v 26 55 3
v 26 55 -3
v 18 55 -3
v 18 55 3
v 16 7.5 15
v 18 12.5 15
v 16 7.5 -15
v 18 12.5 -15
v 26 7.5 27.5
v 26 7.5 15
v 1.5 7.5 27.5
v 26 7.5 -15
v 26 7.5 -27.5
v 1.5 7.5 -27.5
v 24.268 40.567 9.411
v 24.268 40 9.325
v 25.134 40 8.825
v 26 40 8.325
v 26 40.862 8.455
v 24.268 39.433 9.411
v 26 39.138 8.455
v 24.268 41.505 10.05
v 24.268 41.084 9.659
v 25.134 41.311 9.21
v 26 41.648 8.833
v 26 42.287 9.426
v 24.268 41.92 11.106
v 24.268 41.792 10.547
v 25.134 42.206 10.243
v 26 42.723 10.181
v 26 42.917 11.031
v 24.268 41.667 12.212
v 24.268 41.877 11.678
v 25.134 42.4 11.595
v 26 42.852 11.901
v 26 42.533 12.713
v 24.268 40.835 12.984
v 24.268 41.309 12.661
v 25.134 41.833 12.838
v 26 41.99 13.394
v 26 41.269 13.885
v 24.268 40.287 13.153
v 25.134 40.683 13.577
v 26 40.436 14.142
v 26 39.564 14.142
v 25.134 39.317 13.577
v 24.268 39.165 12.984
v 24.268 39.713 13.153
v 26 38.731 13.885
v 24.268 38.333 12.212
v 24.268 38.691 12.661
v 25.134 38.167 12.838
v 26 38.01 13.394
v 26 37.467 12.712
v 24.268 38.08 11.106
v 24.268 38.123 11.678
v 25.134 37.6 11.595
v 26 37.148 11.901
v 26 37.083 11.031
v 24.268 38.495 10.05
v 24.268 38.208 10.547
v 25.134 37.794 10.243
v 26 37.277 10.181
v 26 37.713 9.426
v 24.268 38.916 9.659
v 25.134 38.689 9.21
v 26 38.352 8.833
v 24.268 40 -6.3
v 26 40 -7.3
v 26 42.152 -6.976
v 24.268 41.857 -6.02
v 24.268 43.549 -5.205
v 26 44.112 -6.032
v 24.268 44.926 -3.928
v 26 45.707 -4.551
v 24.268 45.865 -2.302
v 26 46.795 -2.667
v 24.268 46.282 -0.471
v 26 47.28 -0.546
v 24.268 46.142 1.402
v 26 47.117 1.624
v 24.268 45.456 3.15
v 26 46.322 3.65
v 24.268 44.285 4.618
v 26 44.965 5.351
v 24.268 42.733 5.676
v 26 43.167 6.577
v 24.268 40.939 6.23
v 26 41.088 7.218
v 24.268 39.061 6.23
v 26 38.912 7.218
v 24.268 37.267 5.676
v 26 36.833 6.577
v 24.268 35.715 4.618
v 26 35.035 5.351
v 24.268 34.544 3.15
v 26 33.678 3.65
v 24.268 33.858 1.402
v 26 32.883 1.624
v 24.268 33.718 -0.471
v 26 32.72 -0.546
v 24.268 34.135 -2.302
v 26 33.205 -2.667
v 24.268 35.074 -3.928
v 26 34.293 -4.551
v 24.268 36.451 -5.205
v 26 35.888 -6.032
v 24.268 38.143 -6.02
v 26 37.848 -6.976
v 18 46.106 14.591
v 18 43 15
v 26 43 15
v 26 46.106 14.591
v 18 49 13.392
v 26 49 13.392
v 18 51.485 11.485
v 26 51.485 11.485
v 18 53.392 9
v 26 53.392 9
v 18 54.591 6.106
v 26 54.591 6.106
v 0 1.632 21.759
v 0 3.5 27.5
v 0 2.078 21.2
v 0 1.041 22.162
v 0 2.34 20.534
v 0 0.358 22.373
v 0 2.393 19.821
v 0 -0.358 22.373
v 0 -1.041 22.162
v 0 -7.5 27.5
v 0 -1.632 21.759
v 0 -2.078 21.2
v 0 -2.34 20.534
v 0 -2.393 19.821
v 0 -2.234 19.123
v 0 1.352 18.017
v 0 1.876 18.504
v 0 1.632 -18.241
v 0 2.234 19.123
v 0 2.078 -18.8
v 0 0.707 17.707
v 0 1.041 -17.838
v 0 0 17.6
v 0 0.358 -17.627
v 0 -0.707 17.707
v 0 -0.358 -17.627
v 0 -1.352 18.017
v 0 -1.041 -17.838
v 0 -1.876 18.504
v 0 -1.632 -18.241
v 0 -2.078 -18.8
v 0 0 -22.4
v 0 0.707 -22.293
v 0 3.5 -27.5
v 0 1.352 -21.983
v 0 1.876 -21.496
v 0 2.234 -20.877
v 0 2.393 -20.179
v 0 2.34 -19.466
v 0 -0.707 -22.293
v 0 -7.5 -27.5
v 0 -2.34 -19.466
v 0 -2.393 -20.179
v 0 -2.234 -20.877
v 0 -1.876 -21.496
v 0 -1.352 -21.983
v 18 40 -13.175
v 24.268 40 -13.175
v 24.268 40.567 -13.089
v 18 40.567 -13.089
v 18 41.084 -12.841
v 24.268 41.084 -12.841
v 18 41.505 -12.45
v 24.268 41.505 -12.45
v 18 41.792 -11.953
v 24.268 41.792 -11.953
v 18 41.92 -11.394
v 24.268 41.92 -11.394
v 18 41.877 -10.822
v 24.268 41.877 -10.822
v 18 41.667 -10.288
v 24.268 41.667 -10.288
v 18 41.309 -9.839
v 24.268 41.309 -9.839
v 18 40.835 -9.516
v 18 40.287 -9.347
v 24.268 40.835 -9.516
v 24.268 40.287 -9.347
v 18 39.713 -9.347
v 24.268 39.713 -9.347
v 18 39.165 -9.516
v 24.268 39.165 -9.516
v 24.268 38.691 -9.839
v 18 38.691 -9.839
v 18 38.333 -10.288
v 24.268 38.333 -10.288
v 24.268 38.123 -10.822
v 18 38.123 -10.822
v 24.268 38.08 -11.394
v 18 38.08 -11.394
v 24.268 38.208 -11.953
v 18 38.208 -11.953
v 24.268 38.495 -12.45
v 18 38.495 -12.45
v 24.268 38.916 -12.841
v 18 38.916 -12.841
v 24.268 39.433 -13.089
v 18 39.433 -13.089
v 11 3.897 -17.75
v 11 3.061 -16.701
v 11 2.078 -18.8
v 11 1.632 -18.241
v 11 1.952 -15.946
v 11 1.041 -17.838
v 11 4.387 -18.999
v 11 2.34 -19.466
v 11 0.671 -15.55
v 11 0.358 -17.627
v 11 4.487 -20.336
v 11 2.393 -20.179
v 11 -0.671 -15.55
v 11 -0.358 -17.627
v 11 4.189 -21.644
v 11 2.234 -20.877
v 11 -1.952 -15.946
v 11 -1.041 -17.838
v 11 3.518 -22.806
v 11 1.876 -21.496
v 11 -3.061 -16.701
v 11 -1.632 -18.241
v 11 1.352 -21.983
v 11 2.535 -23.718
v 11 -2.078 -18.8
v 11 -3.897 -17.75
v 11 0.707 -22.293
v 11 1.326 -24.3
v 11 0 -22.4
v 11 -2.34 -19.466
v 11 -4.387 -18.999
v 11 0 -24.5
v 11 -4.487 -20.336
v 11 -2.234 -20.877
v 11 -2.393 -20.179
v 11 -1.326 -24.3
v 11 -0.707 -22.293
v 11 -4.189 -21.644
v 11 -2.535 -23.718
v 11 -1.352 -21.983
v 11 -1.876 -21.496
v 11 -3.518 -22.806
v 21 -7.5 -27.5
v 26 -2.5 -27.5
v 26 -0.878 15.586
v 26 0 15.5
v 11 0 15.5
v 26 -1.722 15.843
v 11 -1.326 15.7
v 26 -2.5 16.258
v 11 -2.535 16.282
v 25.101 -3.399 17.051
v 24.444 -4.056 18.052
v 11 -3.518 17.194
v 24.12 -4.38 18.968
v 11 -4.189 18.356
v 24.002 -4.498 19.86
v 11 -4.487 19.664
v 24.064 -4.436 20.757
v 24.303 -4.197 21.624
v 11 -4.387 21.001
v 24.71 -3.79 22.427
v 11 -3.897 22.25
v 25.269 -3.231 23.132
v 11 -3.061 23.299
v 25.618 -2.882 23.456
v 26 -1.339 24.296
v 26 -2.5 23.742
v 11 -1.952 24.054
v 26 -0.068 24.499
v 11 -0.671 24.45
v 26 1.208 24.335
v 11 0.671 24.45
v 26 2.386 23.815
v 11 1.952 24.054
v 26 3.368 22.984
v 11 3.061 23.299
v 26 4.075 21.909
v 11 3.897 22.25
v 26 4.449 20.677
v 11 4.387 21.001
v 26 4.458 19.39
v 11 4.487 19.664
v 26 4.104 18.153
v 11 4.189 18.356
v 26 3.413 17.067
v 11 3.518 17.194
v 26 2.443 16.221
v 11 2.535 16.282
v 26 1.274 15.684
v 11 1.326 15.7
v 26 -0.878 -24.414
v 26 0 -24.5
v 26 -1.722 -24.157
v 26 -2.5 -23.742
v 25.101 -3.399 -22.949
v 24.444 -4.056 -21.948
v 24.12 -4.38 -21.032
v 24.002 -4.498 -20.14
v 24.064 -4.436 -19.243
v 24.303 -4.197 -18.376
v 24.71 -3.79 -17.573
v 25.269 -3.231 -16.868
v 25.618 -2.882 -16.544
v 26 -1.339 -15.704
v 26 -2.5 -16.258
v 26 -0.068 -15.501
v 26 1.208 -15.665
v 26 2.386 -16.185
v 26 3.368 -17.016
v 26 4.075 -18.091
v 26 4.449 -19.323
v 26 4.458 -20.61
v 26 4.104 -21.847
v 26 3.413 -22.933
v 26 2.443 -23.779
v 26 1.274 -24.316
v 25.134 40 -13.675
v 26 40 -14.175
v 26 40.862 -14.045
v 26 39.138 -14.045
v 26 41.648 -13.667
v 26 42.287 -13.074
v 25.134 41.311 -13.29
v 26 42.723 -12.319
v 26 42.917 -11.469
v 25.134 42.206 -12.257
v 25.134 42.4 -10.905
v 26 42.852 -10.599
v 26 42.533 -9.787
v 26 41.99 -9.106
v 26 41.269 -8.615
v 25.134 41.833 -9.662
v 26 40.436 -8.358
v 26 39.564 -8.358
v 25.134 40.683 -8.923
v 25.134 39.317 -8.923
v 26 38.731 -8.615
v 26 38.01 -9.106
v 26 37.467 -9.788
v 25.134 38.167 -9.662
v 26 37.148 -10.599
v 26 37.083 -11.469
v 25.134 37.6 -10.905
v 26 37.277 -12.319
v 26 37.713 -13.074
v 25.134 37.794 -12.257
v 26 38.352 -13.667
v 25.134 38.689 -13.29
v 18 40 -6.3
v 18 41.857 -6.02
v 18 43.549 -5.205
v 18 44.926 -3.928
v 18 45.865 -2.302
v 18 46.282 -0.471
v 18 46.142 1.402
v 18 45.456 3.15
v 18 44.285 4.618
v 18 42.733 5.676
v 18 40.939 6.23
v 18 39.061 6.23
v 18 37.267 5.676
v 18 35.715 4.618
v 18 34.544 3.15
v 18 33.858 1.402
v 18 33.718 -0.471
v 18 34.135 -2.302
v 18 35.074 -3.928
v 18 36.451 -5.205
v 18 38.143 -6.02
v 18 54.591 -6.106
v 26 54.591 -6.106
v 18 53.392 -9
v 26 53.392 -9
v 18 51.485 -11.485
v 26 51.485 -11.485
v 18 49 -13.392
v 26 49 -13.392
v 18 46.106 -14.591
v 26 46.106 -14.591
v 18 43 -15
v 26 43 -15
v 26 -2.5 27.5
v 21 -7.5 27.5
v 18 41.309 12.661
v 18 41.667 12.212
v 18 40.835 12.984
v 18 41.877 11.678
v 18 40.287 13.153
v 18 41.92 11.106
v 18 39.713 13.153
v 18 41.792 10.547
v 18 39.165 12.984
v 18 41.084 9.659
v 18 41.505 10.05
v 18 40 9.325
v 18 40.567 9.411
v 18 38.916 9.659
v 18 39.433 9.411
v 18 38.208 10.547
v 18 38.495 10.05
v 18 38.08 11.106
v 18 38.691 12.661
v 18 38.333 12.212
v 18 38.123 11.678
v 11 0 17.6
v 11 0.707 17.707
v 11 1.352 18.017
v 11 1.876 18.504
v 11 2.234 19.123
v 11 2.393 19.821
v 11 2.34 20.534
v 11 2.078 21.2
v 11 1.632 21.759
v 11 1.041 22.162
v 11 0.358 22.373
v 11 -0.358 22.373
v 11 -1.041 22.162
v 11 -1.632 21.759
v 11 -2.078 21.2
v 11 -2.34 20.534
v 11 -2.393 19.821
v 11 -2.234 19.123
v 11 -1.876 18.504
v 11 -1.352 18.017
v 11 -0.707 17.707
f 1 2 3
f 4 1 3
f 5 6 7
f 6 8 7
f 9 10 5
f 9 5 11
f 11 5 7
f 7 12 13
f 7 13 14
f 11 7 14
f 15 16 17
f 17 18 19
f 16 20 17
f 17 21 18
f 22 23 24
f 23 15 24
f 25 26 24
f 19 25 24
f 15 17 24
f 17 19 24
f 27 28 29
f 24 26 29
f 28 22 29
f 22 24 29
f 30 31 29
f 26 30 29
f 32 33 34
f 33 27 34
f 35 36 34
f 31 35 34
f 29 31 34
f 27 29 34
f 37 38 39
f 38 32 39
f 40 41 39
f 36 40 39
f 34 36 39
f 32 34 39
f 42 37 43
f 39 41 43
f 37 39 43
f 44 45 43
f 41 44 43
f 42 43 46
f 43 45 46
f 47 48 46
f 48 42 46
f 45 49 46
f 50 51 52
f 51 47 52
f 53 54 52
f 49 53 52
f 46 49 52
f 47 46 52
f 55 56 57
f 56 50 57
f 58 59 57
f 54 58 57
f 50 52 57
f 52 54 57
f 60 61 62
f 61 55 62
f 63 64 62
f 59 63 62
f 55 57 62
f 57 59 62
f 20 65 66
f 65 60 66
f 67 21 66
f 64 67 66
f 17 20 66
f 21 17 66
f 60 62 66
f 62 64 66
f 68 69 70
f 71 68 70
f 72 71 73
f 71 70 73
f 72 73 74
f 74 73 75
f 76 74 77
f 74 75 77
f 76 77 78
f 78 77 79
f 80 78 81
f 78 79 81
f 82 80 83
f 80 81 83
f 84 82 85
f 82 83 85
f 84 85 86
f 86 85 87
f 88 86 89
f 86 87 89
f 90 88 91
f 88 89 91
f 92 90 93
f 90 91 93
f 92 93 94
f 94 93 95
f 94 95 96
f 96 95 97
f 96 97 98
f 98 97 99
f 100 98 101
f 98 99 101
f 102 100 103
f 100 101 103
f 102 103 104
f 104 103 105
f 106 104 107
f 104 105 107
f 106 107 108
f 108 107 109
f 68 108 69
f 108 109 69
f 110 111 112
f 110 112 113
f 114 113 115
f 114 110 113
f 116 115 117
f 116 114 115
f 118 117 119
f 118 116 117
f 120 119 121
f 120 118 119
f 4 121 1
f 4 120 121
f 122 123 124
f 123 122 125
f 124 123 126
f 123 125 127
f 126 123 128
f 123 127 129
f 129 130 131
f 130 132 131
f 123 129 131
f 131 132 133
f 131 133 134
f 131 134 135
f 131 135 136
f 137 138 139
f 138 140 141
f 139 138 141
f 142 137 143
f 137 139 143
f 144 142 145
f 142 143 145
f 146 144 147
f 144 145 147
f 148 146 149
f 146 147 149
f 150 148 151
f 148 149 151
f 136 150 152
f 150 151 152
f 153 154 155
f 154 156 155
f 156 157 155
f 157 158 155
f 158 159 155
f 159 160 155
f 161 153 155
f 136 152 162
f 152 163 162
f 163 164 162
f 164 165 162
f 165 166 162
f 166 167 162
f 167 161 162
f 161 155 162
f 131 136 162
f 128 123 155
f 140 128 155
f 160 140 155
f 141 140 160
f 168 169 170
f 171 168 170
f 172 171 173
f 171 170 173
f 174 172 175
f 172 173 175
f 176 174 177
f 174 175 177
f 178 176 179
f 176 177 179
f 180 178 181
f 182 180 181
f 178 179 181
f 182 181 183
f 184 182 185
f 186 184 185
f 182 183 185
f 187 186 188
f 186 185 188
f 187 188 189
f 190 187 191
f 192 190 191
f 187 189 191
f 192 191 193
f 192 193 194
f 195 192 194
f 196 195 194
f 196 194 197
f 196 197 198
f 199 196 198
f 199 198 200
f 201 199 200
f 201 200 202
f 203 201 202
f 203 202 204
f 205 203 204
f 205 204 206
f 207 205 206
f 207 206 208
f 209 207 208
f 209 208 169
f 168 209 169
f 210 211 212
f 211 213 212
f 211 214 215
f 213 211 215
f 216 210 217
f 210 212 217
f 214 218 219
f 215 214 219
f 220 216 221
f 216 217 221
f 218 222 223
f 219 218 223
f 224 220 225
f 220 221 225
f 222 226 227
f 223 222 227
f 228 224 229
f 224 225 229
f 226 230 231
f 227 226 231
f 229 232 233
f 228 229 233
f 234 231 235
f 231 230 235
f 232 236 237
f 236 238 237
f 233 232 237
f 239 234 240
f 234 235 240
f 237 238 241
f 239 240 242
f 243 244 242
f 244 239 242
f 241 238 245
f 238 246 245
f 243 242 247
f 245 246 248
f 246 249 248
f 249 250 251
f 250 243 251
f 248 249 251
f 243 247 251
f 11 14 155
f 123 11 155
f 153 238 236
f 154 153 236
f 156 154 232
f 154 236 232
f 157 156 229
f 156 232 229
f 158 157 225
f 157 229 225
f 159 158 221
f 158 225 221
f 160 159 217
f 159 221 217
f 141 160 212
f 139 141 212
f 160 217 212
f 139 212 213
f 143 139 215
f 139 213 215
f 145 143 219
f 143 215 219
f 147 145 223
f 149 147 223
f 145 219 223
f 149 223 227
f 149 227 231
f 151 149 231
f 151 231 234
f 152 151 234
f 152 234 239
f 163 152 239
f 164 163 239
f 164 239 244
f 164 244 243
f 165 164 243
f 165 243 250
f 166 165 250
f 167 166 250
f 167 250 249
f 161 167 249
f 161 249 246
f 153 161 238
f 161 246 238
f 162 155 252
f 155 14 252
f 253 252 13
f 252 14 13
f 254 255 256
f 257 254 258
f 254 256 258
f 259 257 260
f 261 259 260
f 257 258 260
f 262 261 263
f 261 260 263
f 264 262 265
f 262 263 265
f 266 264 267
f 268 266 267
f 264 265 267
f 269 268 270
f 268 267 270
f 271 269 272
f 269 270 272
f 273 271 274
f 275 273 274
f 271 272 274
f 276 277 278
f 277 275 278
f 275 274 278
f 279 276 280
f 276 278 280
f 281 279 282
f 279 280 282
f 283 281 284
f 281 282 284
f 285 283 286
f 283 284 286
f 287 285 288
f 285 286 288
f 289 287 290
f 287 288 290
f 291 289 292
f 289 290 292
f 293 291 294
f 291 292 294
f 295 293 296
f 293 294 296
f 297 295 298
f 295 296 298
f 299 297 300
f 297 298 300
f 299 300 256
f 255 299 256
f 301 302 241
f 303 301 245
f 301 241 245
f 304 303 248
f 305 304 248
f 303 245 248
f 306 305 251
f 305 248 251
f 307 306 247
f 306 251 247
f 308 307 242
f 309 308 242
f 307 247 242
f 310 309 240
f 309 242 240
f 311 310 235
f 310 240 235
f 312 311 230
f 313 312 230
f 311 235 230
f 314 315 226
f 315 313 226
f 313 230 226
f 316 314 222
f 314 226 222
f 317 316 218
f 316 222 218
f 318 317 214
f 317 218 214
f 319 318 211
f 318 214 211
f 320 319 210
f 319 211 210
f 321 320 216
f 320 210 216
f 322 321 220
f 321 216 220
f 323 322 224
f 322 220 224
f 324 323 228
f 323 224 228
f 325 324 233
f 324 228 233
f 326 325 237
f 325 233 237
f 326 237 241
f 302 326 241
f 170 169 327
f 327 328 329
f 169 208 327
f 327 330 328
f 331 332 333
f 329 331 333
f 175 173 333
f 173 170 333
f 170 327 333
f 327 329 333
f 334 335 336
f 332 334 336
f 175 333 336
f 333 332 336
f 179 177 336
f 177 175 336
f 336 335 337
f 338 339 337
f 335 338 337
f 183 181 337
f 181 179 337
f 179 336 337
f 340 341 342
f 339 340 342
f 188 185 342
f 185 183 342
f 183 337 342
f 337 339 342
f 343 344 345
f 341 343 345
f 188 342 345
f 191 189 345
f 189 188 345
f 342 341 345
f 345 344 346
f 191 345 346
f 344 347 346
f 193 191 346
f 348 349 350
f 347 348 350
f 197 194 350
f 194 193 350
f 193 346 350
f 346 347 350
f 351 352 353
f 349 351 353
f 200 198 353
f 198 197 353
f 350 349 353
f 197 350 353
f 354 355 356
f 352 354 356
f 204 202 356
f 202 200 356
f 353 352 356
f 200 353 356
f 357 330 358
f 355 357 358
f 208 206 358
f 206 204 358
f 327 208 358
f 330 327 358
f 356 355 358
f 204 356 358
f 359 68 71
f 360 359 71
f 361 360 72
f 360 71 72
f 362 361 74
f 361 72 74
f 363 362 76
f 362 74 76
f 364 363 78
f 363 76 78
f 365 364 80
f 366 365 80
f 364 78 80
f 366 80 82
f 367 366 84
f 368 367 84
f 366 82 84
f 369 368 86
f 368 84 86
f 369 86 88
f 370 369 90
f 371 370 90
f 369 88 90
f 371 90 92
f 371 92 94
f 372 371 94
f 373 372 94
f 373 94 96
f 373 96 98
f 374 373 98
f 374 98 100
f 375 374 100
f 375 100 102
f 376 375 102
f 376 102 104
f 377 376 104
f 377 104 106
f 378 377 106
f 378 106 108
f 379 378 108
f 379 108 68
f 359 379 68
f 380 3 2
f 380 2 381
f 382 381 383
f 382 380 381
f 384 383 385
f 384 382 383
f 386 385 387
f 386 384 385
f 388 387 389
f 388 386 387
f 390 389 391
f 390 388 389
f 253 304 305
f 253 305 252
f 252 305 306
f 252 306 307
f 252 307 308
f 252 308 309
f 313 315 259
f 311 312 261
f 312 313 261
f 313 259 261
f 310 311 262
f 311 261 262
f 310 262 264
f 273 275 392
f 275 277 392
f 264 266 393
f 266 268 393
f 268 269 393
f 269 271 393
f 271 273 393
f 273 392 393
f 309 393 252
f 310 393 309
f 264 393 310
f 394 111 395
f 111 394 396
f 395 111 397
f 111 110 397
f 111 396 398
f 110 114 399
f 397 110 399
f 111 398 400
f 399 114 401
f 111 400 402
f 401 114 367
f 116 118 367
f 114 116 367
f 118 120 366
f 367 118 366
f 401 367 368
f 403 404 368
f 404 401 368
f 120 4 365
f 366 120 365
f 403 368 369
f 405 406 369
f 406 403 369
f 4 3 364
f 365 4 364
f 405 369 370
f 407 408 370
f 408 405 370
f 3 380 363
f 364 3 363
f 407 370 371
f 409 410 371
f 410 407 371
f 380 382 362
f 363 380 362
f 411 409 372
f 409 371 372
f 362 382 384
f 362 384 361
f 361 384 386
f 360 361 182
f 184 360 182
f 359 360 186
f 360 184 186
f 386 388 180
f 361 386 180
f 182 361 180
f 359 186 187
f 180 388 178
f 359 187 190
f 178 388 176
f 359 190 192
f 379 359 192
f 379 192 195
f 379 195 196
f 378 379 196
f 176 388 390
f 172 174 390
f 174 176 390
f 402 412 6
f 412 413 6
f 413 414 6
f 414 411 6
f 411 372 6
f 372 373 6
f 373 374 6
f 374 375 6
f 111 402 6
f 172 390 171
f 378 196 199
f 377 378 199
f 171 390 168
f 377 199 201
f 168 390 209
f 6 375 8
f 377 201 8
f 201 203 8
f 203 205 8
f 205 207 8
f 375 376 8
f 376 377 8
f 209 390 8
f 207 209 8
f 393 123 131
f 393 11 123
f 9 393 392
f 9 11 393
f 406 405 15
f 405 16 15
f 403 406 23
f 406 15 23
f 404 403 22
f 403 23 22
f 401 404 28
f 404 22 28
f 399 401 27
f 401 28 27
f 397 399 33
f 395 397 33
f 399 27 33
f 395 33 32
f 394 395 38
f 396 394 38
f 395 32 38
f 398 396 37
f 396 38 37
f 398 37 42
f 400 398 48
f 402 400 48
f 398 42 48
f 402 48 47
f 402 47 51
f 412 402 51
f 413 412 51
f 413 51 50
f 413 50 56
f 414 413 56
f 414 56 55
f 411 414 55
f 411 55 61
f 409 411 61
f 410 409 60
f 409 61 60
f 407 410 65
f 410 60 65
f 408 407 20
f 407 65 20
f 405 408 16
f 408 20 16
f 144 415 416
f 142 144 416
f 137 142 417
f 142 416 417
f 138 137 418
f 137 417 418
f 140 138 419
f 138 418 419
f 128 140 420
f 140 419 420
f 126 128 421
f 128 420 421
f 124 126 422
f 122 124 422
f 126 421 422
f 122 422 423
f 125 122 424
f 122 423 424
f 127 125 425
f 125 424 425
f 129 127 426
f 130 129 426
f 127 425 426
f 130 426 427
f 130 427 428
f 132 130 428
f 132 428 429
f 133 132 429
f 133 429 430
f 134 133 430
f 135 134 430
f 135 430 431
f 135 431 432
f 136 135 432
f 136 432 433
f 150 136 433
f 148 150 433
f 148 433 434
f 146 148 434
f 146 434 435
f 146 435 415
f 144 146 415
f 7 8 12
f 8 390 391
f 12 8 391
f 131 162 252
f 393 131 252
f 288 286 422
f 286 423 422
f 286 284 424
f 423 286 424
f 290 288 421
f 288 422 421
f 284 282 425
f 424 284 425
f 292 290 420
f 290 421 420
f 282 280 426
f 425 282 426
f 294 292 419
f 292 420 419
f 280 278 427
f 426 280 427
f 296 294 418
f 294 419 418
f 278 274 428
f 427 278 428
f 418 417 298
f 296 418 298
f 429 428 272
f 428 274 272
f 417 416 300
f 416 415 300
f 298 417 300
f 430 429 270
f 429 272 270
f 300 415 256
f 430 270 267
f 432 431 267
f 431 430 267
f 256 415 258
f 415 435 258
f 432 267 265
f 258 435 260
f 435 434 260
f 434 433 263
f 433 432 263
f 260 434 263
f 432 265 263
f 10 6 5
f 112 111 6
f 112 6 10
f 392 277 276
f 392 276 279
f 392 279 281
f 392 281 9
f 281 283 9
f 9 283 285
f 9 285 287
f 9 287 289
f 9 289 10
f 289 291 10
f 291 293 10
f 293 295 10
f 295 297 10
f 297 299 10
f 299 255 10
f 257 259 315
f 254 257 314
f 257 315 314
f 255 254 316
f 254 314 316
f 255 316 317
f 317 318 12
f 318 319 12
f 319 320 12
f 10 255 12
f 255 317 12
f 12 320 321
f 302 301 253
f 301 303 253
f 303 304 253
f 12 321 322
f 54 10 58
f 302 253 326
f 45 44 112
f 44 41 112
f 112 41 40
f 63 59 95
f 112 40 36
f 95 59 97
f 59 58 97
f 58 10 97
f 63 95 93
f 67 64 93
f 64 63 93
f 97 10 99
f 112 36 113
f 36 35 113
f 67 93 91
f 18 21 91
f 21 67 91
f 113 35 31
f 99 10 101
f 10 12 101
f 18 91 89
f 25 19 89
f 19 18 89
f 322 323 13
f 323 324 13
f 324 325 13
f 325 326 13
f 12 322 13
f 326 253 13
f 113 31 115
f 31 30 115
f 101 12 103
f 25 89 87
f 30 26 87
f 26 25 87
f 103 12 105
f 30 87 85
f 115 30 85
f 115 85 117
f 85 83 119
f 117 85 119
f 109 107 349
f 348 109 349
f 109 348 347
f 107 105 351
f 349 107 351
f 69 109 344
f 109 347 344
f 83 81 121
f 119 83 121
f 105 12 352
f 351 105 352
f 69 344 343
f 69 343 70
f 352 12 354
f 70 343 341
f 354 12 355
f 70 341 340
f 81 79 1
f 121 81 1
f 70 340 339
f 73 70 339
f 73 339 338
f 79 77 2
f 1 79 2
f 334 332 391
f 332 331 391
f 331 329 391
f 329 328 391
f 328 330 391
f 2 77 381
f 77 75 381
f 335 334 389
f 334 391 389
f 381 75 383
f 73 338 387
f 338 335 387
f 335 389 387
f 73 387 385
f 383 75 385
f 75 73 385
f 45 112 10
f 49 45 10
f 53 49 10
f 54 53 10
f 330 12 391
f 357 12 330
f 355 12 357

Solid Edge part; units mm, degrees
sketch "Sketch1" plane through (0, 0, 0) normal (0, 0, 1) x (1, 0, 0)
  line L0 (0, 7.5) -> (0, -7.5)
  line L1 (0, -7.5) -> (21, -7.5)
  line L2 (21, -7.5) -> (26, -2.5)
  line L3 (26, -2.5) -> (26, 55)
  line L4 (26, 55) -> (18, 55)
  line L5 (18, 55) -> (18, 12.5)
  line L6 (18, 12.5) -> (16, 7.5)
  line L7 (16, 7.5) -> (0, 7.5)
  dimension "D1" = 15
  dimension "D2" = 18
  dimension "D3" = 8
  dimension "D4" = 5
  dimension "D5" = 5
  dimension "D6" = 2
  dimension "D7" = 5
  dimension "D8" = 55
extrude "Protrusion1" add sketch "Sketch1" along normal mid plane 30
hole "Hole_3" at (26, 40, 0) direction (-1, 0, 0) diameter 12.6 end up to next
hole "Hole_4" at (26, 40, 11.25) direction (-1, 0, 0) diameter 3.85 end up to next
hole "Hole1" at (26, 40, -11.25) direction (-1, 0, 0) diameter 3.85 end up to next
chamfer "Chamfer_2" distance 1 angle 60 3 edges at (26, 40, -9.325) (26, 40, 13.175) (26, 40, 6.3) measured on face at (26, 6.5083, 9.7)
hole "Hole_6" at (26, -1.5595, 7.5) direction (-1, 0, 0) diameter 10 end up to next
hole "Hole2" at (26, -1.5595, -7.5) direction (-1, 0, 0) diameter 10 end up to next
sketch "Sketch2" plane through (11.5, 23.75, 0) normal (0, 0, 1) x (1, 0, 0)
  line L0 (-11.5, -31.25) -> (14.5, -31.25)
  line L1 (14.5, -31.25) -> (14.5, -16.25)
  line L2 (14.5, -16.25) -> (-11.5, -16.25)
  line L3 (-11.5, -16.25) -> (-11.5, -31.25)
extrude "Protrusion2" add sketch "Sketch2" along normal mid plane 55
sketch "Sketch3" plane through (11.5, 23.75, 15) normal (0, 0, 1) x (1, 0, 0)
  line L0 (-11.5, -16.25) -> (-10, -16.25)
  line L1 (-10, -16.25) -> (-11.5, -20.25)
  line L2 (-11.5, -20.25) -> (-11.5, -16.25)
  dimension "D1" = 1.5
  dimension "D2" = 4
extrude "ExtrudedCutout_3" cut sketch "Sketch3" along normal mid plane 94
sketch "Sketch4" plane through (11.5, 0, 27.5) normal (0, 0, 1) x (1, 0, 0)
  line L0 (14.5, -7.5) -> (14.5, -2.5)
  line L1 (14.5, -2.5) -> (9.5, -7.5)
  line L2 (9.5, -7.5) -> (14.5, -7.5)
  dimension "D1" = 5
extrude "Cutout1" cut sketch "Sketch4" against normal through all
hole "Hole_8" at (26, 0, 20) direction (-1, 0, 0) diameter 4.8 end up to next counterbore diameter 9 counterbore depth 15
hole "Hole3" at (26, 0, -20) direction (-1, 0, 0) diameter 4.8 end up to next counterbore diameter 9 counterbore depth 15
fillet "Round1" radius 12 2 edges at (22, 55, 15) (22, 55, -15)
properties material "Polyethylene, low density"
